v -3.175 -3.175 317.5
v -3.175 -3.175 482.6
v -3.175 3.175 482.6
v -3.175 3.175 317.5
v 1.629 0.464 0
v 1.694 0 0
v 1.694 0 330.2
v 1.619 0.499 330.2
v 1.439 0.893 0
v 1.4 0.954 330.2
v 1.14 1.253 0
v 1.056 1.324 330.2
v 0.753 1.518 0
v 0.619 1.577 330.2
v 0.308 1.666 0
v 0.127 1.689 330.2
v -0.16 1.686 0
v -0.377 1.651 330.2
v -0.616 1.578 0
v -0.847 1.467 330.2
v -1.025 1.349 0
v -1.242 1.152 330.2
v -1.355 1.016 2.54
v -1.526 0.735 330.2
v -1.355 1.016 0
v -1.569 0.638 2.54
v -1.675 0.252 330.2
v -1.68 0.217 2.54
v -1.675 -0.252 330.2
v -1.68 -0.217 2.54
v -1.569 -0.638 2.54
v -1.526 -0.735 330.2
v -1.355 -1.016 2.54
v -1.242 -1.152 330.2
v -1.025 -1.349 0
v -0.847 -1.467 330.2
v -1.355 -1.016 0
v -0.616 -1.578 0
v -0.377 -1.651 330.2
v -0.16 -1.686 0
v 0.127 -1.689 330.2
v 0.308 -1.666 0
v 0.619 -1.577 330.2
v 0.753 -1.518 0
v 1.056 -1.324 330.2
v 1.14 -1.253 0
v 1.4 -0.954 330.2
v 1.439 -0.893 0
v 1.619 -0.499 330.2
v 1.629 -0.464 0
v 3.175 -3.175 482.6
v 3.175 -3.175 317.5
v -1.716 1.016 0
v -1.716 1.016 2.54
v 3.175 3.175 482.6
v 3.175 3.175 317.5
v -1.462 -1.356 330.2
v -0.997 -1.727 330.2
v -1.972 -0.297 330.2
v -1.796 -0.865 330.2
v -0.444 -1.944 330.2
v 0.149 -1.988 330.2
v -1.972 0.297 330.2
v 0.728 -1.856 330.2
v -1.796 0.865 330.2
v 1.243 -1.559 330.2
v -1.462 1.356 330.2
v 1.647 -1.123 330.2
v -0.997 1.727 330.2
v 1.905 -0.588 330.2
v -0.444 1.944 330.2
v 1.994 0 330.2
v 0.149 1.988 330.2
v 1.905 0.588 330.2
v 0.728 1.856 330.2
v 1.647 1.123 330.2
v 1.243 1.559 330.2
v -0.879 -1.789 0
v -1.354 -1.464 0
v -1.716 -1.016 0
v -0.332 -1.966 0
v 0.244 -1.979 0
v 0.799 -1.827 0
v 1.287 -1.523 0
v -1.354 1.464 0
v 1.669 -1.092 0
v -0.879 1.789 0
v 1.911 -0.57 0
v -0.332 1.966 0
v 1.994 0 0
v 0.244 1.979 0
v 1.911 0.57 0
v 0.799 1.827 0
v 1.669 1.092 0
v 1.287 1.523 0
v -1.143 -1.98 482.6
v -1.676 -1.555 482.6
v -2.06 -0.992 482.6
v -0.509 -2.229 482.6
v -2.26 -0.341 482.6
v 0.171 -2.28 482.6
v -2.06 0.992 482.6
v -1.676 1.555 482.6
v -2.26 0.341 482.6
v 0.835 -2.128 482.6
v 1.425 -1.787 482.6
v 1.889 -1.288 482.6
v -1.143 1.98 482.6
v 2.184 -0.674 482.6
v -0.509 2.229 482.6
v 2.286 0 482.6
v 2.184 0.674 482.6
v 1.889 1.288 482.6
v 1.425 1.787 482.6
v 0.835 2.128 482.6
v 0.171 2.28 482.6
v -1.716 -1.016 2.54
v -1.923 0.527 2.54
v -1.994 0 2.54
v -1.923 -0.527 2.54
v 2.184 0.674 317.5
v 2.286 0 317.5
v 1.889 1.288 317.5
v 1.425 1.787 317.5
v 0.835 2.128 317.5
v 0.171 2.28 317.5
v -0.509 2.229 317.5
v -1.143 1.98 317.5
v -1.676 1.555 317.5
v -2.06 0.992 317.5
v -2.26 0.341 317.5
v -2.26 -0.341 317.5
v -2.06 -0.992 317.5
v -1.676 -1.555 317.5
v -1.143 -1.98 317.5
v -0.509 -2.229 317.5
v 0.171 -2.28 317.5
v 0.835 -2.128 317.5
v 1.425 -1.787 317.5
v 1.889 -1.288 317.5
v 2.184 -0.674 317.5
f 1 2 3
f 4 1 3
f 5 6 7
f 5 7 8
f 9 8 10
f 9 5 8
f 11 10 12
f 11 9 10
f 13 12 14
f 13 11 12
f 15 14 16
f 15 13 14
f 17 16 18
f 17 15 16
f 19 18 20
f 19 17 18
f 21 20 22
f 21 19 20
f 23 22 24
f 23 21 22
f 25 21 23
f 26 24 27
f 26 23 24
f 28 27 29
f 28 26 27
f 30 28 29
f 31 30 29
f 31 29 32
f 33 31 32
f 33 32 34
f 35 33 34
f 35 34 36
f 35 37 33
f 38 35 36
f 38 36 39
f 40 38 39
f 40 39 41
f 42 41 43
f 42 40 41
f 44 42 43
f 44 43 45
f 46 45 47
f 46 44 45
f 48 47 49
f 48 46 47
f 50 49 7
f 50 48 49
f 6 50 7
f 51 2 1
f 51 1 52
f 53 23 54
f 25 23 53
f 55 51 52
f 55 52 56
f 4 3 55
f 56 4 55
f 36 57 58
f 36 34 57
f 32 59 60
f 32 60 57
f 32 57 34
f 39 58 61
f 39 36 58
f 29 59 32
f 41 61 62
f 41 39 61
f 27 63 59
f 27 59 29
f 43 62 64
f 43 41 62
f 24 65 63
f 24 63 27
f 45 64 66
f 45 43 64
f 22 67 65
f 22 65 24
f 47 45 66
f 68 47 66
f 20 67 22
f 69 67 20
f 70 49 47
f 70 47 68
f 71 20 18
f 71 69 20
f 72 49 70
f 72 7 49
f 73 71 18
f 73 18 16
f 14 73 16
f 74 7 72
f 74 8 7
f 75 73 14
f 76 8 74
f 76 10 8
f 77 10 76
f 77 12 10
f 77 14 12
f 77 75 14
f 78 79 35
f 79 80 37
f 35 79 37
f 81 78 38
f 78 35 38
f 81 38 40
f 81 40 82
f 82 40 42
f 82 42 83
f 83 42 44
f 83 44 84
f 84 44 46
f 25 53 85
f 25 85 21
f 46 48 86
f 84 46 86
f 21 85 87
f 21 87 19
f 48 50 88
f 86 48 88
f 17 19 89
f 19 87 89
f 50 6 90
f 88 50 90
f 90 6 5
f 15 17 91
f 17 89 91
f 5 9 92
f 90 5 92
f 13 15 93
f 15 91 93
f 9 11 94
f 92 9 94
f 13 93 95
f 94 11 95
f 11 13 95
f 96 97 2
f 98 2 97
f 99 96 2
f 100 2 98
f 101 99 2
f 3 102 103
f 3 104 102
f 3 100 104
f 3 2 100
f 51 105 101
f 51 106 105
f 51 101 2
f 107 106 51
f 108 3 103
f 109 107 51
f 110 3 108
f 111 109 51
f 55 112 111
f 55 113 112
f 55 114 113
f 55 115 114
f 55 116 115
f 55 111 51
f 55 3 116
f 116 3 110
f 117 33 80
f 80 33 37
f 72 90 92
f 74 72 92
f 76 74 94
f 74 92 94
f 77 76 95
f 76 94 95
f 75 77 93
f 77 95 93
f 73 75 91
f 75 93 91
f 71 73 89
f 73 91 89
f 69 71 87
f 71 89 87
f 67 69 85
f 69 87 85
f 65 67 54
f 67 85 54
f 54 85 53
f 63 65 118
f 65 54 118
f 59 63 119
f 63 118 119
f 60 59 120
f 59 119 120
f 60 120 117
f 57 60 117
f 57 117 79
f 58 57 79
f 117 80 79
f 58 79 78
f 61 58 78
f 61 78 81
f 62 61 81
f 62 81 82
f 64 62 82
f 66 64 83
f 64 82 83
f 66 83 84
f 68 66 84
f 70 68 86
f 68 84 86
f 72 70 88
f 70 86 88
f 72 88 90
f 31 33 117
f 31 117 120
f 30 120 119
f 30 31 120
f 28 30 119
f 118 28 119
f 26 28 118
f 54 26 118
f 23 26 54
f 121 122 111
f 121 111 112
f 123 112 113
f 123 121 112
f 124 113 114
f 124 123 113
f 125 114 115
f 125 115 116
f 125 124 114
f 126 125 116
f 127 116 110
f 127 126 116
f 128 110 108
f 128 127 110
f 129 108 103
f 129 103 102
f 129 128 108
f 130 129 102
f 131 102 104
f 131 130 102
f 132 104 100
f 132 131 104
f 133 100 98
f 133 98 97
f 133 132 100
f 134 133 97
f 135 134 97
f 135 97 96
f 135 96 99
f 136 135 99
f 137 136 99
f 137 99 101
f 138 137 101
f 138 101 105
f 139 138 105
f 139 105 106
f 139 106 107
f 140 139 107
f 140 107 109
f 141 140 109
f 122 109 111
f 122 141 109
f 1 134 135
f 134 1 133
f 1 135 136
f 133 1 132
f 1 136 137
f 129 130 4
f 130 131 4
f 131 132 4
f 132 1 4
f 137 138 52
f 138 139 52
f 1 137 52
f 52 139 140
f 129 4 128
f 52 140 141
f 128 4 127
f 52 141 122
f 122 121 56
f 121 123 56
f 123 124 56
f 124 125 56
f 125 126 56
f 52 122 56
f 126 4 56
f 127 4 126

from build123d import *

# Parameters (mm, degrees)
SKETCH1_R                = 1.9939
SKETCH1_R_2              = 1.6939
BOSS_EXTRUDE1_DEPTH      = 330.2
CUT_EXTRUDE1_REACH       = 332.212
CUT_EXTRUDE1_END_RADIUS  = 1.9939
SKETCH2_W                = 2.54
SKETCH2_H                = 2.032
BOSS_EXTRUDE3_DEPTH      = 152.4
BOSS_EXTRUDE3_DEPTH_BACK = 12.7
SKETCH5_W                = 6.35
SKETCH5_H                = 6.35
SKETCH5_R                = 2.286


with BuildPart() as part:
    # Sketch1 → Boss-Extrude1 (new body)
    with BuildSketch(Plane.XY):
        Circle(SKETCH1_R)
        Circle(SKETCH1_R_2, mode=Mode.SUBTRACT)
    extrude(amount=BOSS_EXTRUDE1_DEPTH)

    # Cut-Extrude1: up to this cylinder (the profile starts inside it)
    cut_extrude1_end = Plane(origin=(0, 0, 1.27), z_dir=(0, 0, -1)) * Cylinder(CUT_EXTRUDE1_END_RADIUS, 669.4118, mode=Mode.PRIVATE)
    # Sketch2 → Cut-Extrude1 (cut, up to the surface)
    with BuildSketch(Plane(origin=(0, 0, 0), x_dir=(0, 0, -1), z_dir=(1, 0, 0)), mode=Mode.PRIVATE) as cut_extrude1_sk1:
        with Locations((-1.27, 0)):
            Rectangle(SKETCH2_W, SKETCH2_H)
    cut_extrude1_tool1 = extrude(cut_extrude1_sk1.sketch, amount=-CUT_EXTRUDE1_REACH, mode=Mode.PRIVATE) & cut_extrude1_end
    add(cut_extrude1_tool1.solids().sort_by_distance((0, 0, 1.27))[0], mode=Mode.SUBTRACT)


with BuildPart() as body_2:
    # Sketch5 → Boss-Extrude3 (new, two sides: drawn at the far end of the back side and taken through both)
    with BuildSketch(Plane.XY.offset(330.2).offset(-BOSS_EXTRUDE3_DEPTH_BACK)):
        Rectangle(SKETCH5_W, SKETCH5_H)
        Circle(SKETCH5_R, mode=Mode.SUBTRACT)
    extrude(amount=BOSS_EXTRUDE3_DEPTH + BOSS_EXTRUDE3_DEPTH_BACK)


solid = Compound([part.part, body_2.part])
